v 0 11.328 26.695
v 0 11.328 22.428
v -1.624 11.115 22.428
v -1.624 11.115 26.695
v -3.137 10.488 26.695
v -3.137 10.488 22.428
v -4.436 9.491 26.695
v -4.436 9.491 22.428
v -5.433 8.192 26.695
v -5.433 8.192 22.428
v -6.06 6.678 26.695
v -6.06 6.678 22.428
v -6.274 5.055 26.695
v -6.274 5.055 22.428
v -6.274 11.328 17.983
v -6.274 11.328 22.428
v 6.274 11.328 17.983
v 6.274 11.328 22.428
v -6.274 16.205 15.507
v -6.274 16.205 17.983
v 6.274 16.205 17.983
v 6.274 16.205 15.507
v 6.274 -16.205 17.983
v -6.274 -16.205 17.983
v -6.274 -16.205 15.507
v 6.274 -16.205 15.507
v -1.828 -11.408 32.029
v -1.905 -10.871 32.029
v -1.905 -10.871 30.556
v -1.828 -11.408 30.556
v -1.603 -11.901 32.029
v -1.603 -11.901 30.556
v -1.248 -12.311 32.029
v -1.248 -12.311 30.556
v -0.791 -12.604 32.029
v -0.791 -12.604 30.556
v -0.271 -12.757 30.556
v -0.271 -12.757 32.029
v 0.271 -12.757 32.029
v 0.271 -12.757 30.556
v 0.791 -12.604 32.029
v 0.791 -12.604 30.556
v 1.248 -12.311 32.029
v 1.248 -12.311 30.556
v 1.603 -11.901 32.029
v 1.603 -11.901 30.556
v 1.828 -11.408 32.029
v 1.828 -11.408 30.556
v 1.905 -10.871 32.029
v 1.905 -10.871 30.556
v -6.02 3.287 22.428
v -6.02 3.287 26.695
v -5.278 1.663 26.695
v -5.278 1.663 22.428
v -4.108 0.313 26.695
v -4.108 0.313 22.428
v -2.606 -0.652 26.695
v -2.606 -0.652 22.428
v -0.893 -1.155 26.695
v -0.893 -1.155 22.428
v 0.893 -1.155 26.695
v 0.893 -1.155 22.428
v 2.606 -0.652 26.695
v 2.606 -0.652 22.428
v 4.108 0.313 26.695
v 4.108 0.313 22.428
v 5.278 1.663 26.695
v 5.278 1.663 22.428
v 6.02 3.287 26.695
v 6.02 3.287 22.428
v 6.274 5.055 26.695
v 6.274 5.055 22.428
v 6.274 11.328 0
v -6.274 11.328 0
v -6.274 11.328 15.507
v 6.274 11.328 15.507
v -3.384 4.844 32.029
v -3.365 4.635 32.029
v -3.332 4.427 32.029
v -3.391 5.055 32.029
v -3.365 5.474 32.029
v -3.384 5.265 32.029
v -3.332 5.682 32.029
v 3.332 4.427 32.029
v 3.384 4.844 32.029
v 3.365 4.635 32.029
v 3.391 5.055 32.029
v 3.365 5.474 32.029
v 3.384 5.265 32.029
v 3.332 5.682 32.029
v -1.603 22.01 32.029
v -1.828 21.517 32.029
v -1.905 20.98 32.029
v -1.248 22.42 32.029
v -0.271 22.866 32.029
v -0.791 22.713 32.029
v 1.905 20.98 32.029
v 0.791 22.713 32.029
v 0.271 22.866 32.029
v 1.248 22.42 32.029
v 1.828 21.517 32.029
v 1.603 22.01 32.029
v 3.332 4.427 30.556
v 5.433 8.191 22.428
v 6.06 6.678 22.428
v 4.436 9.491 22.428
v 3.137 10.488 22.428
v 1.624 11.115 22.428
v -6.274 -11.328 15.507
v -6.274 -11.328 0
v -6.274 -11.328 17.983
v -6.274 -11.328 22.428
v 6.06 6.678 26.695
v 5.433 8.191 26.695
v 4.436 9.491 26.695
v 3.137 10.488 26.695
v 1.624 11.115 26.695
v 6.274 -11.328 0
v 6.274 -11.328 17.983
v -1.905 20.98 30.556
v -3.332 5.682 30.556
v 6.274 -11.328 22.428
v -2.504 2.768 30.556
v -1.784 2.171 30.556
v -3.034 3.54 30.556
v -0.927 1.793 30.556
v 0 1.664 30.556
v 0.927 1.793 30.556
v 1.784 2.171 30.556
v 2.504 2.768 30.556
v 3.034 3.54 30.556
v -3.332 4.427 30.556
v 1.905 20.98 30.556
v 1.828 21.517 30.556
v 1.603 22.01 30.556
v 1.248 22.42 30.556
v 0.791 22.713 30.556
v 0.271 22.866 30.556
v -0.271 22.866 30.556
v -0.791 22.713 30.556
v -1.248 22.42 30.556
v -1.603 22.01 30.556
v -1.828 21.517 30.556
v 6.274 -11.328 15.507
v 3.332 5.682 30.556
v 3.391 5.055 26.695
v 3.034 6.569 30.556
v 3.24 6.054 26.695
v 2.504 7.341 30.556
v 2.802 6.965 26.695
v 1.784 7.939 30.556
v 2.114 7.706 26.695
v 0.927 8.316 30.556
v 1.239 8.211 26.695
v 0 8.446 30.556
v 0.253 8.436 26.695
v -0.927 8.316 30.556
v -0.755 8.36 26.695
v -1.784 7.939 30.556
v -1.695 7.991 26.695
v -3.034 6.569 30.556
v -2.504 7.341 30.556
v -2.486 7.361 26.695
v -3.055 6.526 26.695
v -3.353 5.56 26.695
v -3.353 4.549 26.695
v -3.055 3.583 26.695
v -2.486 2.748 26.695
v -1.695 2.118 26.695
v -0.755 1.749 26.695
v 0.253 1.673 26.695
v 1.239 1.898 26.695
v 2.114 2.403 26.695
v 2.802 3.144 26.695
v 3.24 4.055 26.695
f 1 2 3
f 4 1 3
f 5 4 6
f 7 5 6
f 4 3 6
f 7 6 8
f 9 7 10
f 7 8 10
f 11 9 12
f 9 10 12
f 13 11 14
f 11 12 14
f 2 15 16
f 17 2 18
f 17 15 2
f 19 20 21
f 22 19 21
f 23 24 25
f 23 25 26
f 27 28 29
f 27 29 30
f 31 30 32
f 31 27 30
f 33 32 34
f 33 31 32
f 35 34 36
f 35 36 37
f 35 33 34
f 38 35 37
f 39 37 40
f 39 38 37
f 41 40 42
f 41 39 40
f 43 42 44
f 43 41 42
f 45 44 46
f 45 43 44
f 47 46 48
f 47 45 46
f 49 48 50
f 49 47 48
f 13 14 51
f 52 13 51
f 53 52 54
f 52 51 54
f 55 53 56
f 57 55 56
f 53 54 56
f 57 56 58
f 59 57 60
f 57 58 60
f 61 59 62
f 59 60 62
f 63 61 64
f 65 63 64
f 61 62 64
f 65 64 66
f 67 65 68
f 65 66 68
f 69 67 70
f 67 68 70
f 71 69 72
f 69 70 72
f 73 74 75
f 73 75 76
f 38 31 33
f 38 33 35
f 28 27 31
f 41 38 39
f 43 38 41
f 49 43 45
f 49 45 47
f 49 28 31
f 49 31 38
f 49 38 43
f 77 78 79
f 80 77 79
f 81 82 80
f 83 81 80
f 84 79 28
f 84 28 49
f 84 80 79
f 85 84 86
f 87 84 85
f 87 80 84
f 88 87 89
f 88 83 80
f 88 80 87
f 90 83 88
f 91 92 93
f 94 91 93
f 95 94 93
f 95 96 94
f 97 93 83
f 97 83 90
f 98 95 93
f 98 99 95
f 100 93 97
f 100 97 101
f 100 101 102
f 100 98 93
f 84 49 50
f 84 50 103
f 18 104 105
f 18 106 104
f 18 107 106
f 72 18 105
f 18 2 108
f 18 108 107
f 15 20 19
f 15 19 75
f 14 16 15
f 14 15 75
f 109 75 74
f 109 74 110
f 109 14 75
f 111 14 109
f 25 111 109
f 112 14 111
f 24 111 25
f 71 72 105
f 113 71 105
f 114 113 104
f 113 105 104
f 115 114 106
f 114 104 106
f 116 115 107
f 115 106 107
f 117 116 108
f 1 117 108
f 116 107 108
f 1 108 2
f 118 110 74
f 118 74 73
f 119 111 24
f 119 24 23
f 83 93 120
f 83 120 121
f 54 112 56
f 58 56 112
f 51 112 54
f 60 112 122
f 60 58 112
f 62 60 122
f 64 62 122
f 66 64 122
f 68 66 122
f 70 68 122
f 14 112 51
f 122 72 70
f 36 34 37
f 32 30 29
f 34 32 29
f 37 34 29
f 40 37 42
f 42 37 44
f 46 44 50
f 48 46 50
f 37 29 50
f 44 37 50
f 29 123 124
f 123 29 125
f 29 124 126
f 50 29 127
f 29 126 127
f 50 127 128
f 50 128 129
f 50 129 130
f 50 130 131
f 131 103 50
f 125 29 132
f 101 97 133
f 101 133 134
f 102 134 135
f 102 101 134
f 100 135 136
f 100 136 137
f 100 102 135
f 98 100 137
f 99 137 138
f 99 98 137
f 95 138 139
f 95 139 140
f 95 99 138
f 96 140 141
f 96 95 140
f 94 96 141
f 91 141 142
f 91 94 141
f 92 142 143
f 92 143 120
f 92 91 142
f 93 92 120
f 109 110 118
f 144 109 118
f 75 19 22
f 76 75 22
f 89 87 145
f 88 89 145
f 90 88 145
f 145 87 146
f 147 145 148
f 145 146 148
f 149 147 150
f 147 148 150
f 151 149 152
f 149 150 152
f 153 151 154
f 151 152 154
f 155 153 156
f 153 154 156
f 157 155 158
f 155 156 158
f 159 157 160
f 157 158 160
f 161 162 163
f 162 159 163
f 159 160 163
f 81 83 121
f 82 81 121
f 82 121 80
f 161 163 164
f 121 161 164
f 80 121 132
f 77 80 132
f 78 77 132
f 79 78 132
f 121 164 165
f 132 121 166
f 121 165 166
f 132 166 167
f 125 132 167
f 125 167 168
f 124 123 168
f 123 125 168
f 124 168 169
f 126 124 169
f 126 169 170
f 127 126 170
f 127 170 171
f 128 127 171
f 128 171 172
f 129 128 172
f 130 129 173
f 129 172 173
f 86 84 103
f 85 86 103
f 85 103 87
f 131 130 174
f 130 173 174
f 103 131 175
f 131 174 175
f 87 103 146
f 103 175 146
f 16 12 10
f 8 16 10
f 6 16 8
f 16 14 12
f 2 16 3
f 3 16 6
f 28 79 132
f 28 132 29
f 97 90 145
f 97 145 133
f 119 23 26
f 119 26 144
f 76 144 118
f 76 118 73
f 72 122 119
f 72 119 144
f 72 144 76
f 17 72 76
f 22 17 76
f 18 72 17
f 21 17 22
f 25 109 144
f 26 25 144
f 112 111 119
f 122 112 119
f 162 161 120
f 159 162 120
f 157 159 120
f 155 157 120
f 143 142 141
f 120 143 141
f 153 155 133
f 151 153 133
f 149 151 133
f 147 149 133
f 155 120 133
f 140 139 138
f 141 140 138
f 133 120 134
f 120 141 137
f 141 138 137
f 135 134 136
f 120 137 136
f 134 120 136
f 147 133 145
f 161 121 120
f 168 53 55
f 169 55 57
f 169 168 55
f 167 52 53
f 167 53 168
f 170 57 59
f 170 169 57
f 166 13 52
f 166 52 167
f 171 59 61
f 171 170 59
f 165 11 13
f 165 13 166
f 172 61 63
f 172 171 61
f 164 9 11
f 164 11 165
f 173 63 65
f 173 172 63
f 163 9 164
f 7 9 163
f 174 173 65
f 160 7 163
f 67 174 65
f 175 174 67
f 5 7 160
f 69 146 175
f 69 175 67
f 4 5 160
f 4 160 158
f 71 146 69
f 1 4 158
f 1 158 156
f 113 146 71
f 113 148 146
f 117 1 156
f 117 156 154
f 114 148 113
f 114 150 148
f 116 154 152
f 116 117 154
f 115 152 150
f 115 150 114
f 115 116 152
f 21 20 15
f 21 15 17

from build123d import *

# Parameters (mm, degrees)
F0_W      = 12.5476
F0_H      = 22.6568
F1_DEPTH  = 22.4282
F3_W      = 12.5476
F3_H      = 22.6568
F3_H_2    = 4.8768
F4_DEPTH  = 2.4765
F6_DEPTH  = 4.2672
F7_R      = 3.3909
F8_DEPTH  = 5.334
F10_DEPTH = 1.4732


with BuildPart() as f1:
    # F0 (on Top) → F1 (new body)
    with BuildSketch(Plane.XY):
        Rectangle(F0_W, F0_H)
    extrude(amount=F1_DEPTH)

    # F3 (on offset) → F4 (join)
    with BuildSketch(Plane.XY.offset(17.9832)):
        Rectangle(F3_W, F3_H)
        with Locations((0, -13.7668)):
            Rectangle(F3_W, F3_H_2)
        with Locations((0, 13.7668)):
            Rectangle(F3_W, F3_H_2)
    extrude(amount=-F4_DEPTH)

    # F5 (on face) → F6 (join)
    with BuildSketch(Plane.XY.offset(22.4282)):
        with BuildLine():
            ThreePointArc((-6.2738, 5.0546), (0, -1.2192), (6.2738, 5.0546))
            ThreePointArc((6.2738, 5.0546), (4.4362465254, 9.4908465222), (4.5e-09, 11.3284))
            ThreePointArc((4.5e-09, 11.3284), (-4.4362465222, 9.4908465254), (-6.2738, 5.0546))
        make_face()
    extrude(amount=F6_DEPTH)

    # F7 (on face) → F8 (join)
    with BuildSketch(Plane.XY.offset(26.6954)):
        with Locations((0, 5.0546)):
            Circle(F7_R)
    extrude(amount=F8_DEPTH)

    # F9 (on face) → F10 (join)
    with BuildSketch(Plane.XY.offset(32.0294)):
        with BuildLine():
            Line((3.3909, 5.0546), (3.3323728486, 4.4273089926))
            ThreePointArc((3.3323728486, 4.4273089926), (3.376236507, 4.7395922876), (3.3909, 5.0546))
        make_face()
        with BuildLine():
            Line((1.905, -10.8712), (3.3323728486, 4.4273089926))
            Line((3.3323728486, 4.4273089926), (3.3909, 5.0546))
            Line((3.3909, 5.0546), (3.3323728486, 5.6818910074))
            Line((3.3323728486, 5.6818910074), (1.905, 20.9804))
            ThreePointArc((1.905, 20.9804), (0, 22.8854), (-1.905, 20.9804))
            Line((-1.905, 20.9804), (-3.3323728486, 5.6818910074))
            Line((-3.3323728486, 5.6818910074), (-3.3909, 5.0546))
            Line((-3.3909, 5.0546), (-3.3323728486, 4.4273089926))
            Line((-3.3323728486, 4.4273089926), (-1.905, -10.8712))
            ThreePointArc((-1.905, -10.8712), (0, -12.7762), (1.905, -10.8712))
        make_face()
        with BuildLine():
            Line((3.3323728486, 5.6818910074), (3.3909, 5.0546))
            ThreePointArc((3.3909, 5.0546), (3.376236507, 5.3696077124), (3.3323728486, 5.6818910074))
        make_face()
        with BuildLine():
            ThreePointArc((-3.3909, 5.0546), (-3.376236507, 4.7395922876), (-3.3323728486, 4.4273089926))
            Line((-3.3323728486, 4.4273089926), (-3.3909, 5.0546))
        make_face()
        with BuildLine():
            ThreePointArc((-3.3323728486, 5.6818910074), (-3.376236507, 5.3696077124), (-3.3909, 5.0546))
            Line((-3.3909, 5.0546), (-3.3323728486, 5.6818910074))
        make_face()
    extrude(amount=-F10_DEPTH)


solid = f1.part
